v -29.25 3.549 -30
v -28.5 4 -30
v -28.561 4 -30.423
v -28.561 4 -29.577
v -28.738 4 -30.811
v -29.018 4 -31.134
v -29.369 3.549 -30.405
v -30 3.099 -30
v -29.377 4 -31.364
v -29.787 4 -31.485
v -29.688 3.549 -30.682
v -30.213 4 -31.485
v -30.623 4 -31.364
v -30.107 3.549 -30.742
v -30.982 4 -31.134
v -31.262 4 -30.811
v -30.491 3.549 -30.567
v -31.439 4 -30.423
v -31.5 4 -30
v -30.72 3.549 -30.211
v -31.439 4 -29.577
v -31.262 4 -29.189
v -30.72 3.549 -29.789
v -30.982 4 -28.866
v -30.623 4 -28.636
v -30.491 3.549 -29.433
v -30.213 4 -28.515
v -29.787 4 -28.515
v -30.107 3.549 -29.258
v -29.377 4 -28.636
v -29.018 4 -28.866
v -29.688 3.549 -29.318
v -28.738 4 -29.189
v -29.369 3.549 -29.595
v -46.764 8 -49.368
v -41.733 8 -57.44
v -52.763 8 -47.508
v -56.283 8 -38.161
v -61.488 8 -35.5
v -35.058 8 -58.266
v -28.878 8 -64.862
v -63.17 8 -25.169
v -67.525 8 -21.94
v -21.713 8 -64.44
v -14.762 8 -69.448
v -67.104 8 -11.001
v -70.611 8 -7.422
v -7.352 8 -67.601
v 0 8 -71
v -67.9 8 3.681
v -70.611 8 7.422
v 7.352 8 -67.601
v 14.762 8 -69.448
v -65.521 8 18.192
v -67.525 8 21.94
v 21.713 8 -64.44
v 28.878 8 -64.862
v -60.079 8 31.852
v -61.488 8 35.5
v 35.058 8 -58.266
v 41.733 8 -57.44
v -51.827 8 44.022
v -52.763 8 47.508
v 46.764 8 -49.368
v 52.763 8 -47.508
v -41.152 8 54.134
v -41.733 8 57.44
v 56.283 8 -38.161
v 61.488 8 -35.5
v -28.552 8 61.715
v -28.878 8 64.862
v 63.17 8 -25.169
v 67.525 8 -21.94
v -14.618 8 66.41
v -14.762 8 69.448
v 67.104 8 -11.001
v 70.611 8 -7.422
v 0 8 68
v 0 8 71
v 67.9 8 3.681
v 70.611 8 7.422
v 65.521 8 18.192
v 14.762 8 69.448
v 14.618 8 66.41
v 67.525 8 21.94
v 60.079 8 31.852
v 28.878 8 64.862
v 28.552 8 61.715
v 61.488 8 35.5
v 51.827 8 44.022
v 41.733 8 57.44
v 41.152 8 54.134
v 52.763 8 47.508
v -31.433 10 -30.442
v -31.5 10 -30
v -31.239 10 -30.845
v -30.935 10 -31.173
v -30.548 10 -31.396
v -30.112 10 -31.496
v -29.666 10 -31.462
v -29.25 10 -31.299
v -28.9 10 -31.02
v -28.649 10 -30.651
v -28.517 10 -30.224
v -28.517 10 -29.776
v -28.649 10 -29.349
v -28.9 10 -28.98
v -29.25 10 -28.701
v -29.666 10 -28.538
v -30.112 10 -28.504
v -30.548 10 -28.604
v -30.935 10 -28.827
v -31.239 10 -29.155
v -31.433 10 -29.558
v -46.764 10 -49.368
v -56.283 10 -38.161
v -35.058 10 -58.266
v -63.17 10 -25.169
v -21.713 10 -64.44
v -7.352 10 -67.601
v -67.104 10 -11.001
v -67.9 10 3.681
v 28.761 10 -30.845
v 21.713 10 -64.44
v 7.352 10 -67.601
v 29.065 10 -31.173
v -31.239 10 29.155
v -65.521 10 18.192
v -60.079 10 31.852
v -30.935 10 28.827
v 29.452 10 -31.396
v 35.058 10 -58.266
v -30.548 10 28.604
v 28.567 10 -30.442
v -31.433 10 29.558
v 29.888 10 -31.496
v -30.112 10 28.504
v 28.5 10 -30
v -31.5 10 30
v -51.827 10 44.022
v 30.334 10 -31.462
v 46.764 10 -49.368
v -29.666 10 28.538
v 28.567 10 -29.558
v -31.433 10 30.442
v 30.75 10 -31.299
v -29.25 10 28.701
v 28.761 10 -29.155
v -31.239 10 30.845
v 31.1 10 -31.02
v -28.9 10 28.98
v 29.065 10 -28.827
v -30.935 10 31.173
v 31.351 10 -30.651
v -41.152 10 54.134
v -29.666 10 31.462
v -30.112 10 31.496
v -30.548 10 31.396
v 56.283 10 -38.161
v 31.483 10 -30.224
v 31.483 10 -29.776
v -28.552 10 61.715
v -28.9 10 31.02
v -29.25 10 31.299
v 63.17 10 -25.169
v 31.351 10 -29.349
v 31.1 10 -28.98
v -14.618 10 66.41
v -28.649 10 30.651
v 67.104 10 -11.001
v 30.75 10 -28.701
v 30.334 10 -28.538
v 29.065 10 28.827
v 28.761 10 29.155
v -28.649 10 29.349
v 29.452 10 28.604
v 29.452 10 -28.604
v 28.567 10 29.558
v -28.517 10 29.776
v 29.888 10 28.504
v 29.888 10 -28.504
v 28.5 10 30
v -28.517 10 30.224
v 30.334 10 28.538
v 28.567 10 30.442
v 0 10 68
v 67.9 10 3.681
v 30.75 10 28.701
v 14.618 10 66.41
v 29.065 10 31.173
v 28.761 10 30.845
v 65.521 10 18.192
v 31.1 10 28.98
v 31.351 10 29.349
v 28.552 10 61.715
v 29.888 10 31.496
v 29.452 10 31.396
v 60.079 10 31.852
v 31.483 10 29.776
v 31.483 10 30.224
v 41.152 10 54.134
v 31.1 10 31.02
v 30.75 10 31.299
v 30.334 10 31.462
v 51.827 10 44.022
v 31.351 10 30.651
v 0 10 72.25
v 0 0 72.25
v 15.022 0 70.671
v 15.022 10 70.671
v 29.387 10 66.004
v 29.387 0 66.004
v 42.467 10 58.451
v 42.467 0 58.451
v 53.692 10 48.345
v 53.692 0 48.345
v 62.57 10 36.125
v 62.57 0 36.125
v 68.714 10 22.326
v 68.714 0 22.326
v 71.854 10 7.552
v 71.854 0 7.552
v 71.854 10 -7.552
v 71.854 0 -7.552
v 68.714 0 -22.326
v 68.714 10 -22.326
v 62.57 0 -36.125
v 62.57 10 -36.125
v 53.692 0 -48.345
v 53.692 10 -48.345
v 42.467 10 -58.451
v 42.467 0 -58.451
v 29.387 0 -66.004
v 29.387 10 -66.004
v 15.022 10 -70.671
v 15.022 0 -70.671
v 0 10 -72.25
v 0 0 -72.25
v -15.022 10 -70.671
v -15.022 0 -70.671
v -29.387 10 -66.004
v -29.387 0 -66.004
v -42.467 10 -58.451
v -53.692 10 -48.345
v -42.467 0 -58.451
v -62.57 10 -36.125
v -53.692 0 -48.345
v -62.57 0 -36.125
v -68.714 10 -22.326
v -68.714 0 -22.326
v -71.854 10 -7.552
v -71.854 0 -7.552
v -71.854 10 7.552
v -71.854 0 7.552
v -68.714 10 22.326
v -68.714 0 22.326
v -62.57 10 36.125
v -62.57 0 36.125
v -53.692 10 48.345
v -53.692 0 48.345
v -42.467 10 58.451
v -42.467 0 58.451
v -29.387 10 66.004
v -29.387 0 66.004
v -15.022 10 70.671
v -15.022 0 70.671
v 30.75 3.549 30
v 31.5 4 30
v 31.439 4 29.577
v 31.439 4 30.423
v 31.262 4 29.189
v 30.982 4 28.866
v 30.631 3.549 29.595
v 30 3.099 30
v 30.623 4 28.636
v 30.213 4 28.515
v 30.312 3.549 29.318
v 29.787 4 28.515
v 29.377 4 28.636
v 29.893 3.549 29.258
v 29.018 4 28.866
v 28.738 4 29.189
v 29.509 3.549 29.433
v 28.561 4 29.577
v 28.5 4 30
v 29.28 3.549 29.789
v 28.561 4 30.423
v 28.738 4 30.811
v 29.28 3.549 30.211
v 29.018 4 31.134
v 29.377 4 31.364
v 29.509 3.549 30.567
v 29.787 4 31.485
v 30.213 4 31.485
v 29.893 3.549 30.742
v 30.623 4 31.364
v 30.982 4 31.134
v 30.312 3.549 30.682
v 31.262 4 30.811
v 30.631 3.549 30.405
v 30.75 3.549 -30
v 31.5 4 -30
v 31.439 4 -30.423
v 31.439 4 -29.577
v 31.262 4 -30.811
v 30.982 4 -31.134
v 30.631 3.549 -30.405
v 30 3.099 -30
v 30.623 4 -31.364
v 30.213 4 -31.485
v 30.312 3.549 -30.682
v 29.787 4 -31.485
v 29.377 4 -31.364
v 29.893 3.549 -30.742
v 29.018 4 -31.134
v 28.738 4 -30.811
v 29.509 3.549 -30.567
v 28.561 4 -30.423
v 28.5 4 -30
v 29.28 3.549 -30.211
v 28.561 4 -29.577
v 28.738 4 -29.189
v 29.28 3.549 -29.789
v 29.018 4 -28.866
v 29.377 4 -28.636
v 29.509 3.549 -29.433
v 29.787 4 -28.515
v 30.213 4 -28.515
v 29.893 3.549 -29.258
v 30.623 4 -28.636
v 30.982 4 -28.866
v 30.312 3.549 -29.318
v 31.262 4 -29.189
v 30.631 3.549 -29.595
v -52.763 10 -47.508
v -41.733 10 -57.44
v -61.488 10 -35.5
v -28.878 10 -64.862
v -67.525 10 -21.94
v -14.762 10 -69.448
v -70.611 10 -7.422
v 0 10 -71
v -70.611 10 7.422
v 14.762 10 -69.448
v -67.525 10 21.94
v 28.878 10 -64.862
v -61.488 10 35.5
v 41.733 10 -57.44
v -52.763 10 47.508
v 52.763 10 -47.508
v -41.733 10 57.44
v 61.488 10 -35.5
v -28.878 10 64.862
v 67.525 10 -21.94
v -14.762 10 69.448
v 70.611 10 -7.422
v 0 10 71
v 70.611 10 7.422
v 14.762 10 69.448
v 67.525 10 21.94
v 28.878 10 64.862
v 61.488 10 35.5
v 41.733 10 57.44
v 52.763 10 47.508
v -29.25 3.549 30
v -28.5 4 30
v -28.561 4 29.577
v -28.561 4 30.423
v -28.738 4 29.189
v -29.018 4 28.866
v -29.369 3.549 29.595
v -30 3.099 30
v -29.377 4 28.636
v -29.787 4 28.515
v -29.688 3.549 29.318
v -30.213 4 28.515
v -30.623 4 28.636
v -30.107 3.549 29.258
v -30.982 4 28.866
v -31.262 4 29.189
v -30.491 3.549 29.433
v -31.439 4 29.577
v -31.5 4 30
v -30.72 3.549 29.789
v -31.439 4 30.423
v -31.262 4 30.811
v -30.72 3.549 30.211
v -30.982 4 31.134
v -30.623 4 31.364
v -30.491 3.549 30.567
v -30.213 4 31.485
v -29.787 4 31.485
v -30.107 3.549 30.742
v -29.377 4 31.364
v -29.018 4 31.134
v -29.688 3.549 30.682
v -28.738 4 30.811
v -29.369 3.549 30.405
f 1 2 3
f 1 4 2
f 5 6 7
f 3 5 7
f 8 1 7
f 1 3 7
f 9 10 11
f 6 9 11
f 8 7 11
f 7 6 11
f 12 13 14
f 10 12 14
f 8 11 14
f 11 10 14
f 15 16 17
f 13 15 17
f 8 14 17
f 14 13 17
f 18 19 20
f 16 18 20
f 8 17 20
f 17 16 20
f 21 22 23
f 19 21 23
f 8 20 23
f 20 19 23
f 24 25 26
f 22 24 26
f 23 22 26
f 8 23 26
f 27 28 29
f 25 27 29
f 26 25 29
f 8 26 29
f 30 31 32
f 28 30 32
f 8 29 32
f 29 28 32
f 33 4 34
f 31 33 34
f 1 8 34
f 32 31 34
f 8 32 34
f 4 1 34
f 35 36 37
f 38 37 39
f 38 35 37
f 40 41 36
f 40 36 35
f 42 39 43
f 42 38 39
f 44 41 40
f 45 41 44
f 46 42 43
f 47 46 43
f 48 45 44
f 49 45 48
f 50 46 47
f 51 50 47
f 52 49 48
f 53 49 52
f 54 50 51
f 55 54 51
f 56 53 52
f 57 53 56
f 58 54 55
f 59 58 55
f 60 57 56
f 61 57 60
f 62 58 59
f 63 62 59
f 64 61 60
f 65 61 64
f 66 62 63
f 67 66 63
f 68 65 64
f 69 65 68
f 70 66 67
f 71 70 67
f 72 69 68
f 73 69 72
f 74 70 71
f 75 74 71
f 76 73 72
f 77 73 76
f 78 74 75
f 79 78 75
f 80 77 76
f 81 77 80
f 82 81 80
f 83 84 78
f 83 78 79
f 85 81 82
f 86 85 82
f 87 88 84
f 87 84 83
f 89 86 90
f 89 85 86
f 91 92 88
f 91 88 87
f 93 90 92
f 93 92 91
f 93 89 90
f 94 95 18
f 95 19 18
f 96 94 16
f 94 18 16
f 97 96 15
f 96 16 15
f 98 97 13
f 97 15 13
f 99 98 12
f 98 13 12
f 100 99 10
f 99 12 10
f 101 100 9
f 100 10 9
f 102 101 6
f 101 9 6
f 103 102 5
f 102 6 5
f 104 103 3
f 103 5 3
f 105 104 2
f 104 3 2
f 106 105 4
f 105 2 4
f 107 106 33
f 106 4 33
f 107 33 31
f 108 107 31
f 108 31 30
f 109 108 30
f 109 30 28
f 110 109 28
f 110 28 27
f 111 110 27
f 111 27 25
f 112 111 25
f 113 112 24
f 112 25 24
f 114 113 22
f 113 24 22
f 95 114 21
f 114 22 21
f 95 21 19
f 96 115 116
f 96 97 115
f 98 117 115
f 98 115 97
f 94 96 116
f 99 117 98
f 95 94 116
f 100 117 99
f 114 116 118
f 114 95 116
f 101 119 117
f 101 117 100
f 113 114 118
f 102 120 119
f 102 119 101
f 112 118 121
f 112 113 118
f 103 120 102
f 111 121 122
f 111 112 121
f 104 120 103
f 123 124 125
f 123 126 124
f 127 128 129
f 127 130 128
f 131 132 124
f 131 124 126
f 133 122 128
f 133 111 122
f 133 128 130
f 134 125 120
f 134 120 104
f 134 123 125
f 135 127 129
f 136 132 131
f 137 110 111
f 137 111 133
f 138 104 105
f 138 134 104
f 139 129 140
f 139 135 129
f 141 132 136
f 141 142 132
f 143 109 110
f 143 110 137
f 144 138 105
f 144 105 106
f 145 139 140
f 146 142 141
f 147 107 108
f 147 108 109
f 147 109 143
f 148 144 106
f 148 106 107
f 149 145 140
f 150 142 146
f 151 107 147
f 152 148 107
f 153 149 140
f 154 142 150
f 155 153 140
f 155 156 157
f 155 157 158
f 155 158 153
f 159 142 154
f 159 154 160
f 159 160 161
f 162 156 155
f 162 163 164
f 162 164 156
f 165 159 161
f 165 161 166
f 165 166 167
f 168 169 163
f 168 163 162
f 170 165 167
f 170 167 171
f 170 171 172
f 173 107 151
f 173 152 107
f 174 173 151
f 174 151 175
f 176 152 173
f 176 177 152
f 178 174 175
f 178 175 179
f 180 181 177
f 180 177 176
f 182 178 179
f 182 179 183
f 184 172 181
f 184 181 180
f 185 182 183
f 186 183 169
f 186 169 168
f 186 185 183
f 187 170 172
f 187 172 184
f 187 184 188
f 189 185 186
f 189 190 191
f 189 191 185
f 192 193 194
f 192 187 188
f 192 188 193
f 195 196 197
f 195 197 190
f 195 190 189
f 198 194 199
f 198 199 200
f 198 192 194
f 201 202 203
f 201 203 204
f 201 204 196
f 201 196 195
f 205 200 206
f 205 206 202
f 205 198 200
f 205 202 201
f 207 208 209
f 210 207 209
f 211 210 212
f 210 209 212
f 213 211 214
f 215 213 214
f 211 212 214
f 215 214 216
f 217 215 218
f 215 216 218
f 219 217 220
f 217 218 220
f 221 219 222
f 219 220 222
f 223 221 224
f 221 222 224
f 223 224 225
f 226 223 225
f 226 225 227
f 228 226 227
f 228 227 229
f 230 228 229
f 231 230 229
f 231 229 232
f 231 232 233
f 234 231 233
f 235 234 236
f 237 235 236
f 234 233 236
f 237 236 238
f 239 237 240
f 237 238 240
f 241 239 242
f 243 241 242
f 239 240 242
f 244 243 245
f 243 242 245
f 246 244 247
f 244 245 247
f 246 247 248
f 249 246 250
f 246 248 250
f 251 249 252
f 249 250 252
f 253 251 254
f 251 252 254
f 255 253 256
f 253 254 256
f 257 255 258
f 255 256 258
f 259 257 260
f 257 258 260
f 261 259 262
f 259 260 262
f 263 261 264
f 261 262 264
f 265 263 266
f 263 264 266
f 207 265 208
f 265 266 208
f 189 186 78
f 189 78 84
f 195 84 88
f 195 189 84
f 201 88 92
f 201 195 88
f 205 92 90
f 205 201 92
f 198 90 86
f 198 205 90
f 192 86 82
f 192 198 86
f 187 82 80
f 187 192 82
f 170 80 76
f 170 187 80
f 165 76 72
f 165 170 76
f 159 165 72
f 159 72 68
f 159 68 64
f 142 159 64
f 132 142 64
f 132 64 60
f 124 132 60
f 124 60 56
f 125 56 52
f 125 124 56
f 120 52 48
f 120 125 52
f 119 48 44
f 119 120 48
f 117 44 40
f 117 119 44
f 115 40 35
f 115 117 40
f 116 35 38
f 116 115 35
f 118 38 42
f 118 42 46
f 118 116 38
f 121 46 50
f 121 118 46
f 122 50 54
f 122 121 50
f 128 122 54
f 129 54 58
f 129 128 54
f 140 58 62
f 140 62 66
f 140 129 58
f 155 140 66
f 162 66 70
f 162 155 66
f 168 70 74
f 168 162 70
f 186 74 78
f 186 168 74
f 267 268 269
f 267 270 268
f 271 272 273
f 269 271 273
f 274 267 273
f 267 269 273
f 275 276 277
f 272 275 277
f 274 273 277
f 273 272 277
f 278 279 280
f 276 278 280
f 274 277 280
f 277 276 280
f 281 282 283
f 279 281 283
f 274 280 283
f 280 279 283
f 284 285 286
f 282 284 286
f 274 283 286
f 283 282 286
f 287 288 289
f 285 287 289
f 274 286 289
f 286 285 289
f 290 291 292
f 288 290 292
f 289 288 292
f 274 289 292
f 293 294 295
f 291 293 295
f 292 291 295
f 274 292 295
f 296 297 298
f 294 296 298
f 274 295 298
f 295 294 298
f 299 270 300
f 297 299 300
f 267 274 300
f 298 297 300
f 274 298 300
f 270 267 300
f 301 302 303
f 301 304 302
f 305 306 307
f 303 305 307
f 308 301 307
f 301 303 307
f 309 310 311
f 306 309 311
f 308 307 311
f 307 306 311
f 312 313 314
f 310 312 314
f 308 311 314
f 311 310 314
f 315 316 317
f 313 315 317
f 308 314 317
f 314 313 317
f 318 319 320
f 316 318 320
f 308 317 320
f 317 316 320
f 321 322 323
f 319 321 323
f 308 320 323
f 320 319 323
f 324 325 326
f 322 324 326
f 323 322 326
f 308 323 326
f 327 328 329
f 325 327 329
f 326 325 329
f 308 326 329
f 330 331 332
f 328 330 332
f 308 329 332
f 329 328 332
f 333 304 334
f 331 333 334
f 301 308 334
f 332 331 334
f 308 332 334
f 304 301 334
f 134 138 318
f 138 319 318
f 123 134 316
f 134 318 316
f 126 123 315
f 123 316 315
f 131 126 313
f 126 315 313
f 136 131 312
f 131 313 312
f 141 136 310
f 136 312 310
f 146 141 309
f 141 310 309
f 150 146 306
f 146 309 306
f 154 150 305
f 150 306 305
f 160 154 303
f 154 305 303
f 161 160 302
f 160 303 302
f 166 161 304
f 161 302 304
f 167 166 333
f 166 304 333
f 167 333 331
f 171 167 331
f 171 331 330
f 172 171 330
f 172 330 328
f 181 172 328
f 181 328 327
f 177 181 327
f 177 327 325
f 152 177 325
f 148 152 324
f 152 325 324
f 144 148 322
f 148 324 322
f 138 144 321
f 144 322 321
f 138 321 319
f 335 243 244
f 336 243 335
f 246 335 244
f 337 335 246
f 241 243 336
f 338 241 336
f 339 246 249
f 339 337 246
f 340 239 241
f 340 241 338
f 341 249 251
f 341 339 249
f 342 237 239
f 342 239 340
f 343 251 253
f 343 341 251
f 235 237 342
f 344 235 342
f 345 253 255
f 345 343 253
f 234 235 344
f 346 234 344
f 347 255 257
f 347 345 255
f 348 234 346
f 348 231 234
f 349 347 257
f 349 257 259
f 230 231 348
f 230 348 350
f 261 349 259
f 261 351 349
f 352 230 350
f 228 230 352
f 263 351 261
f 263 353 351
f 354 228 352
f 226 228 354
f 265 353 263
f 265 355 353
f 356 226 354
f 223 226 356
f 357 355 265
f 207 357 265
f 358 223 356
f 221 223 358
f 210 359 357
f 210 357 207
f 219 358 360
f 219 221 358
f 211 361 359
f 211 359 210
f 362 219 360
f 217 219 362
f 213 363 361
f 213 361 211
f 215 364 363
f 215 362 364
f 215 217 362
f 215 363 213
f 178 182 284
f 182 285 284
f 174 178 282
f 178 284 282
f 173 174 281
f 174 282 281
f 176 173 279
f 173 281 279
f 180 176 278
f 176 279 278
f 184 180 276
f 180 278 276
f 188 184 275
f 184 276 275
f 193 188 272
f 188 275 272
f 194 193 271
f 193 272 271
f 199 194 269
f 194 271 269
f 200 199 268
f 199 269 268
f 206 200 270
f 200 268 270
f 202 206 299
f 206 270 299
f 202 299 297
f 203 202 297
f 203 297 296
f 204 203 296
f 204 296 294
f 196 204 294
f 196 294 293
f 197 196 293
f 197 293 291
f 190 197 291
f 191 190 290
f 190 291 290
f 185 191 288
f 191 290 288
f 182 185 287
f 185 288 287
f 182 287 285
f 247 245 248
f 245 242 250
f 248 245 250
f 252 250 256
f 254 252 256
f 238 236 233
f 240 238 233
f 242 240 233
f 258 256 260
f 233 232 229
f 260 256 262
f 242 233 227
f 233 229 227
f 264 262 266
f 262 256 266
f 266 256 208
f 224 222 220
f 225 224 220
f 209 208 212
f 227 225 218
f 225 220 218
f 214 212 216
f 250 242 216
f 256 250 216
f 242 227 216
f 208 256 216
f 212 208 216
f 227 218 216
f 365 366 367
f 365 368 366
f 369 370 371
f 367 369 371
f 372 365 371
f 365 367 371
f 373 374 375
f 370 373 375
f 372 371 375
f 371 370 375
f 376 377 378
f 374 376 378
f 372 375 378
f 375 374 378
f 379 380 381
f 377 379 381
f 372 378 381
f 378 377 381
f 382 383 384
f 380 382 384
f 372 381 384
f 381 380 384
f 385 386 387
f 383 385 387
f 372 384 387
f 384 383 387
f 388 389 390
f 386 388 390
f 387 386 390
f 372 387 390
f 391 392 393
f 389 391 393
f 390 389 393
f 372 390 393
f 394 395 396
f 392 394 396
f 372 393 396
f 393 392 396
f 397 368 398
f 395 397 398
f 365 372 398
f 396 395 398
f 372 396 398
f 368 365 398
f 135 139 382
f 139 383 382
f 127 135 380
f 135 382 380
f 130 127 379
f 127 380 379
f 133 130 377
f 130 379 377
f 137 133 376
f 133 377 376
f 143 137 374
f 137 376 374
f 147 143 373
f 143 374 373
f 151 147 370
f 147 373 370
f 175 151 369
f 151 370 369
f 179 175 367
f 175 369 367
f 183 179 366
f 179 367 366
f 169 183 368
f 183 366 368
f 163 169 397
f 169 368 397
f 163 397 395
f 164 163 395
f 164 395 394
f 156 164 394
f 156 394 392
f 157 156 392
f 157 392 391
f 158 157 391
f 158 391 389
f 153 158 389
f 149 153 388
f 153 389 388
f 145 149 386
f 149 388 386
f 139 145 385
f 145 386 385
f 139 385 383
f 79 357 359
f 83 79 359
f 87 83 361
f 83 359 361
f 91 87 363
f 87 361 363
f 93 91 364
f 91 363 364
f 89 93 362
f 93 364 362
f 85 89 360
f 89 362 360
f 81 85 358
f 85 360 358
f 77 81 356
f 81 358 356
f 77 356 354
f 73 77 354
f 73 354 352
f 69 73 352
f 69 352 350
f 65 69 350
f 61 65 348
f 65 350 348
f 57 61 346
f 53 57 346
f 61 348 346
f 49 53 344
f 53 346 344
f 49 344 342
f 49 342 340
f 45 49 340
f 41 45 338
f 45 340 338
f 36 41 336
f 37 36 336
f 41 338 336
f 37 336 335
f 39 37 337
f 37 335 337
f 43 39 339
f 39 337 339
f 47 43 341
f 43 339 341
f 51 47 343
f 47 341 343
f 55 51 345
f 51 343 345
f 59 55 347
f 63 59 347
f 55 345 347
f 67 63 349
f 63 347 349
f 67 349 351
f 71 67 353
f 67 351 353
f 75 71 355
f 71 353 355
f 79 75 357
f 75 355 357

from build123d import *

# Parameters (mm, degrees)
SKETCH_1_R          = 72.25
EXTRUDE_7_DEPTH     = 10
F_3_0MM_1_D         = 3
F_3_0MM_1_DEPTH     = 6
F_3_0MM_1_TIP       = 0.901290929
CUT_EXTRUDE_START   = 10
SKETCH_1_11_R       = 71
SKETCH_1_11_R_2     = 68
CUT_EXTRUDE_1_DEPTH = 2


with BuildPart() as part:
    # 草圖1 → 填料-伸長7 (new body)
    with BuildSketch(Plane(origin=(0, 0, 0), x_dir=(1, 0, 0), z_dir=(0, 1, 0))):
        with Locations(Location((0, 0, 0), (0, 0, 270))):
            Circle(SKETCH_1_R)
    extrude(amount=EXTRUDE_7_DEPTH)

    # Ø3.0mm 定位孔1
    with Locations(Plane(origin=(0, 10, 0), x_dir=(1, 0, 0), z_dir=(0, 1, 0))):
        with Locations((-30, 30), (-30, -30), (30, -30), (30, 30)):
            Hole(F_3_0MM_1_D / 2, depth=F_3_0MM_1_DEPTH)
            with Locations((0, 0, -(F_3_0MM_1_DEPTH + F_3_0MM_1_TIP / 2))):  # 118° drill point
                Cone(0, F_3_0MM_1_D / 2, F_3_0MM_1_TIP, mode=Mode.SUBTRACT)

    # 草圖1<11> → 除料-伸長1 (cut)
    with BuildSketch(Plane(origin=(0, 0, 0), x_dir=(1, 0, 0), z_dir=(0, 1, 0)).offset(CUT_EXTRUDE_START)):
        with Locations(Location((0, 0, 0), (0, 0, 270))):
            Circle(SKETCH_1_11_R)
        with Locations(Location((0, 0, 0), (0, 0, 270))):
            Circle(SKETCH_1_11_R_2, mode=Mode.SUBTRACT)
    extrude(amount=-CUT_EXTRUDE_1_DEPTH, mode=Mode.SUBTRACT)


solid = part.part
